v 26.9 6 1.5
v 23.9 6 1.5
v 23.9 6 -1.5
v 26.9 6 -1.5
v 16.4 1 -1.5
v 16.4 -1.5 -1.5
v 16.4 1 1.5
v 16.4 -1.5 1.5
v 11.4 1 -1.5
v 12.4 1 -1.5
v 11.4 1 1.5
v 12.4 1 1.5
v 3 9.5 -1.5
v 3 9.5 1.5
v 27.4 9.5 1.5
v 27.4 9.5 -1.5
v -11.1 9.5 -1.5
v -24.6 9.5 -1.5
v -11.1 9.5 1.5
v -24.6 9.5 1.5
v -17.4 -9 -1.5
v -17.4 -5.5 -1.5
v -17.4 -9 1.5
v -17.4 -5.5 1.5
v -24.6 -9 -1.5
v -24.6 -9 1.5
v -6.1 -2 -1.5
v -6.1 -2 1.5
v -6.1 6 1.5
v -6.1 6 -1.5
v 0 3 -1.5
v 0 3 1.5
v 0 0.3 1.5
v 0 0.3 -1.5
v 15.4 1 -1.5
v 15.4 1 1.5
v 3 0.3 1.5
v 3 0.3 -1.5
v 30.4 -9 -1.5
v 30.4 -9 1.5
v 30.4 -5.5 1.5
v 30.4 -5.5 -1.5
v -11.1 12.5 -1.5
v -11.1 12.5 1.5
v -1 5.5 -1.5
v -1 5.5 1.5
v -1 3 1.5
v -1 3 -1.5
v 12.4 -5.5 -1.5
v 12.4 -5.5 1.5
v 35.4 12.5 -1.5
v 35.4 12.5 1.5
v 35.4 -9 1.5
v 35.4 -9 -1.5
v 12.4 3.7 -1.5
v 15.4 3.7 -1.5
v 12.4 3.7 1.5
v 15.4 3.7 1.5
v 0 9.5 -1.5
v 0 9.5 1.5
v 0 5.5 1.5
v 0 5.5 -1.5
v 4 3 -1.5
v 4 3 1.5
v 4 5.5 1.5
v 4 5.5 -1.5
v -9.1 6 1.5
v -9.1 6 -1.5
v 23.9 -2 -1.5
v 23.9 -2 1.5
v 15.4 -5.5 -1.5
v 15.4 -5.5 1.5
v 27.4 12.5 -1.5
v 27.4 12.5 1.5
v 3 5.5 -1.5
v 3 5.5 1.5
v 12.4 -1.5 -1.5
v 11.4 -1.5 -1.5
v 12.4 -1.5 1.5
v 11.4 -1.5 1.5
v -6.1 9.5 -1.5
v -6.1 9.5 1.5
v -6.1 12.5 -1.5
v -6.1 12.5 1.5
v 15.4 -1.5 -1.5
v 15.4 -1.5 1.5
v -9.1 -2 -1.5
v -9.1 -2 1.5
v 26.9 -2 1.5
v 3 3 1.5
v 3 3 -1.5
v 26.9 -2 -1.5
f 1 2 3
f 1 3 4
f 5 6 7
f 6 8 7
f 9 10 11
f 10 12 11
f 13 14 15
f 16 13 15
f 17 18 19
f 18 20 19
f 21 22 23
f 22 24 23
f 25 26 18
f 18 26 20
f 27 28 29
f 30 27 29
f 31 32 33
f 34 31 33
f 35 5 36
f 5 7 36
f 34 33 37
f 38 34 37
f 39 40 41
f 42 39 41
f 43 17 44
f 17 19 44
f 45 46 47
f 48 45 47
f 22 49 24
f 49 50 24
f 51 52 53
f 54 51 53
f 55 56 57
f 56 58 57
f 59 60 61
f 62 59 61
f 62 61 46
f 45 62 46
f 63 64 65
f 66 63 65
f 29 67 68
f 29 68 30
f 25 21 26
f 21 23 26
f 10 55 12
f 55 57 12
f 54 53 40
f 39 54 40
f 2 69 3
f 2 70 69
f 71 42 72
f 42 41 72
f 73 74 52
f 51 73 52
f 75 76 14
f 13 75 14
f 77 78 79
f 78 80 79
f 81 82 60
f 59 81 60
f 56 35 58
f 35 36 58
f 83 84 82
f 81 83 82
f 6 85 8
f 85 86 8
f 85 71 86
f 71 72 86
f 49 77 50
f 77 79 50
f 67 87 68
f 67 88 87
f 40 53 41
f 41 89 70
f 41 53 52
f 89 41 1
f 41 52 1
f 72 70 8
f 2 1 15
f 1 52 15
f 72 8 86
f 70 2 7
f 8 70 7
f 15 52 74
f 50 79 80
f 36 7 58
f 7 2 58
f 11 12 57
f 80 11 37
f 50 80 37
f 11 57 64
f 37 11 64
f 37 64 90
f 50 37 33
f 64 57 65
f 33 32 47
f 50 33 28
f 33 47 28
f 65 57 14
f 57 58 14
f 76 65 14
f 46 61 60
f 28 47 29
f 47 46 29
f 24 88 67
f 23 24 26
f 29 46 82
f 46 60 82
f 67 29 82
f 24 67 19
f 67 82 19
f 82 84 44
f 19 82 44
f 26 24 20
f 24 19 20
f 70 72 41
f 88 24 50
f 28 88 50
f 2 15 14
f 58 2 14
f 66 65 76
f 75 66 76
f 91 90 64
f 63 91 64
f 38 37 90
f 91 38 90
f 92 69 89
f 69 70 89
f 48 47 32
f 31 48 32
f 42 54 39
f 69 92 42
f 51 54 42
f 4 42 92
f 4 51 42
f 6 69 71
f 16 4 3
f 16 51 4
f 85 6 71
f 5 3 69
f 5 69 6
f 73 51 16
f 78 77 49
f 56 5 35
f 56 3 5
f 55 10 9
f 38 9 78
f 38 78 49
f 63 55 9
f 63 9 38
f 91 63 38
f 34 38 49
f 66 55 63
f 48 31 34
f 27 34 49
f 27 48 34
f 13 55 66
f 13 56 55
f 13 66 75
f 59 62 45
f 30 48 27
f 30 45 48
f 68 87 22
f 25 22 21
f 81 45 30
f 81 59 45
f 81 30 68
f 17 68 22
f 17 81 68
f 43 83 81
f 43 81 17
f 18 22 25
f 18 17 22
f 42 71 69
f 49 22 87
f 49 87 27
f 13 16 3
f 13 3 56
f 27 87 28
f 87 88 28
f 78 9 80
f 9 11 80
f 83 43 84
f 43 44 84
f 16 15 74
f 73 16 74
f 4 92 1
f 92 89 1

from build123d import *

# Parameters (mm, degrees)
SKETCH1_W           = 3
SKETCH1_H           = 8
BOSS_EXTRUDE1_DEPTH = 1.5


with BuildPart() as part:
    # Sketch1 → Boss-Extrude1 (new, symmetric)
    with BuildSketch(Plane.XY):
        Polygon((30.4, -9), (30.4, -5.5), (15.4, -5.5), (15.4, -1.5), (16.4, -1.5), (16.4, 1), (15.4, 1), (15.4, 3.7), (12.4, 3.7), (12.4, 1), (11.4, 1), (11.4, -1.5), (12.4, -1.5), (12.4, -5.5), (-17.4, -5.5), (-17.4, -9), (-24.6, -9), (-24.6, 9.5), (-11.1, 9.5), (-11.1, 12.5), (-6.1, 12.5), (-6.1, 9.5), (0, 9.5), (0, 5.5), (-1, 5.5), (-1, 3), (0, 3), (0, 0.3), (3, 0.3), (3, 3), (4, 3), (4, 5.5), (3, 5.5), (3, 9.5), (27.4, 9.5), (27.4, 12.5), (35.4, 12.5), (35.4, -9), align=None)
        with Locations((25.4, 2)):
            Rectangle(SKETCH1_W, SKETCH1_H, mode=Mode.SUBTRACT)
        with Locations((-7.6, 2)):
            Rectangle(SKETCH1_W, SKETCH1_H, mode=Mode.SUBTRACT)
    extrude(amount=BOSS_EXTRUDE1_DEPTH, both=True)


solid = part.part
